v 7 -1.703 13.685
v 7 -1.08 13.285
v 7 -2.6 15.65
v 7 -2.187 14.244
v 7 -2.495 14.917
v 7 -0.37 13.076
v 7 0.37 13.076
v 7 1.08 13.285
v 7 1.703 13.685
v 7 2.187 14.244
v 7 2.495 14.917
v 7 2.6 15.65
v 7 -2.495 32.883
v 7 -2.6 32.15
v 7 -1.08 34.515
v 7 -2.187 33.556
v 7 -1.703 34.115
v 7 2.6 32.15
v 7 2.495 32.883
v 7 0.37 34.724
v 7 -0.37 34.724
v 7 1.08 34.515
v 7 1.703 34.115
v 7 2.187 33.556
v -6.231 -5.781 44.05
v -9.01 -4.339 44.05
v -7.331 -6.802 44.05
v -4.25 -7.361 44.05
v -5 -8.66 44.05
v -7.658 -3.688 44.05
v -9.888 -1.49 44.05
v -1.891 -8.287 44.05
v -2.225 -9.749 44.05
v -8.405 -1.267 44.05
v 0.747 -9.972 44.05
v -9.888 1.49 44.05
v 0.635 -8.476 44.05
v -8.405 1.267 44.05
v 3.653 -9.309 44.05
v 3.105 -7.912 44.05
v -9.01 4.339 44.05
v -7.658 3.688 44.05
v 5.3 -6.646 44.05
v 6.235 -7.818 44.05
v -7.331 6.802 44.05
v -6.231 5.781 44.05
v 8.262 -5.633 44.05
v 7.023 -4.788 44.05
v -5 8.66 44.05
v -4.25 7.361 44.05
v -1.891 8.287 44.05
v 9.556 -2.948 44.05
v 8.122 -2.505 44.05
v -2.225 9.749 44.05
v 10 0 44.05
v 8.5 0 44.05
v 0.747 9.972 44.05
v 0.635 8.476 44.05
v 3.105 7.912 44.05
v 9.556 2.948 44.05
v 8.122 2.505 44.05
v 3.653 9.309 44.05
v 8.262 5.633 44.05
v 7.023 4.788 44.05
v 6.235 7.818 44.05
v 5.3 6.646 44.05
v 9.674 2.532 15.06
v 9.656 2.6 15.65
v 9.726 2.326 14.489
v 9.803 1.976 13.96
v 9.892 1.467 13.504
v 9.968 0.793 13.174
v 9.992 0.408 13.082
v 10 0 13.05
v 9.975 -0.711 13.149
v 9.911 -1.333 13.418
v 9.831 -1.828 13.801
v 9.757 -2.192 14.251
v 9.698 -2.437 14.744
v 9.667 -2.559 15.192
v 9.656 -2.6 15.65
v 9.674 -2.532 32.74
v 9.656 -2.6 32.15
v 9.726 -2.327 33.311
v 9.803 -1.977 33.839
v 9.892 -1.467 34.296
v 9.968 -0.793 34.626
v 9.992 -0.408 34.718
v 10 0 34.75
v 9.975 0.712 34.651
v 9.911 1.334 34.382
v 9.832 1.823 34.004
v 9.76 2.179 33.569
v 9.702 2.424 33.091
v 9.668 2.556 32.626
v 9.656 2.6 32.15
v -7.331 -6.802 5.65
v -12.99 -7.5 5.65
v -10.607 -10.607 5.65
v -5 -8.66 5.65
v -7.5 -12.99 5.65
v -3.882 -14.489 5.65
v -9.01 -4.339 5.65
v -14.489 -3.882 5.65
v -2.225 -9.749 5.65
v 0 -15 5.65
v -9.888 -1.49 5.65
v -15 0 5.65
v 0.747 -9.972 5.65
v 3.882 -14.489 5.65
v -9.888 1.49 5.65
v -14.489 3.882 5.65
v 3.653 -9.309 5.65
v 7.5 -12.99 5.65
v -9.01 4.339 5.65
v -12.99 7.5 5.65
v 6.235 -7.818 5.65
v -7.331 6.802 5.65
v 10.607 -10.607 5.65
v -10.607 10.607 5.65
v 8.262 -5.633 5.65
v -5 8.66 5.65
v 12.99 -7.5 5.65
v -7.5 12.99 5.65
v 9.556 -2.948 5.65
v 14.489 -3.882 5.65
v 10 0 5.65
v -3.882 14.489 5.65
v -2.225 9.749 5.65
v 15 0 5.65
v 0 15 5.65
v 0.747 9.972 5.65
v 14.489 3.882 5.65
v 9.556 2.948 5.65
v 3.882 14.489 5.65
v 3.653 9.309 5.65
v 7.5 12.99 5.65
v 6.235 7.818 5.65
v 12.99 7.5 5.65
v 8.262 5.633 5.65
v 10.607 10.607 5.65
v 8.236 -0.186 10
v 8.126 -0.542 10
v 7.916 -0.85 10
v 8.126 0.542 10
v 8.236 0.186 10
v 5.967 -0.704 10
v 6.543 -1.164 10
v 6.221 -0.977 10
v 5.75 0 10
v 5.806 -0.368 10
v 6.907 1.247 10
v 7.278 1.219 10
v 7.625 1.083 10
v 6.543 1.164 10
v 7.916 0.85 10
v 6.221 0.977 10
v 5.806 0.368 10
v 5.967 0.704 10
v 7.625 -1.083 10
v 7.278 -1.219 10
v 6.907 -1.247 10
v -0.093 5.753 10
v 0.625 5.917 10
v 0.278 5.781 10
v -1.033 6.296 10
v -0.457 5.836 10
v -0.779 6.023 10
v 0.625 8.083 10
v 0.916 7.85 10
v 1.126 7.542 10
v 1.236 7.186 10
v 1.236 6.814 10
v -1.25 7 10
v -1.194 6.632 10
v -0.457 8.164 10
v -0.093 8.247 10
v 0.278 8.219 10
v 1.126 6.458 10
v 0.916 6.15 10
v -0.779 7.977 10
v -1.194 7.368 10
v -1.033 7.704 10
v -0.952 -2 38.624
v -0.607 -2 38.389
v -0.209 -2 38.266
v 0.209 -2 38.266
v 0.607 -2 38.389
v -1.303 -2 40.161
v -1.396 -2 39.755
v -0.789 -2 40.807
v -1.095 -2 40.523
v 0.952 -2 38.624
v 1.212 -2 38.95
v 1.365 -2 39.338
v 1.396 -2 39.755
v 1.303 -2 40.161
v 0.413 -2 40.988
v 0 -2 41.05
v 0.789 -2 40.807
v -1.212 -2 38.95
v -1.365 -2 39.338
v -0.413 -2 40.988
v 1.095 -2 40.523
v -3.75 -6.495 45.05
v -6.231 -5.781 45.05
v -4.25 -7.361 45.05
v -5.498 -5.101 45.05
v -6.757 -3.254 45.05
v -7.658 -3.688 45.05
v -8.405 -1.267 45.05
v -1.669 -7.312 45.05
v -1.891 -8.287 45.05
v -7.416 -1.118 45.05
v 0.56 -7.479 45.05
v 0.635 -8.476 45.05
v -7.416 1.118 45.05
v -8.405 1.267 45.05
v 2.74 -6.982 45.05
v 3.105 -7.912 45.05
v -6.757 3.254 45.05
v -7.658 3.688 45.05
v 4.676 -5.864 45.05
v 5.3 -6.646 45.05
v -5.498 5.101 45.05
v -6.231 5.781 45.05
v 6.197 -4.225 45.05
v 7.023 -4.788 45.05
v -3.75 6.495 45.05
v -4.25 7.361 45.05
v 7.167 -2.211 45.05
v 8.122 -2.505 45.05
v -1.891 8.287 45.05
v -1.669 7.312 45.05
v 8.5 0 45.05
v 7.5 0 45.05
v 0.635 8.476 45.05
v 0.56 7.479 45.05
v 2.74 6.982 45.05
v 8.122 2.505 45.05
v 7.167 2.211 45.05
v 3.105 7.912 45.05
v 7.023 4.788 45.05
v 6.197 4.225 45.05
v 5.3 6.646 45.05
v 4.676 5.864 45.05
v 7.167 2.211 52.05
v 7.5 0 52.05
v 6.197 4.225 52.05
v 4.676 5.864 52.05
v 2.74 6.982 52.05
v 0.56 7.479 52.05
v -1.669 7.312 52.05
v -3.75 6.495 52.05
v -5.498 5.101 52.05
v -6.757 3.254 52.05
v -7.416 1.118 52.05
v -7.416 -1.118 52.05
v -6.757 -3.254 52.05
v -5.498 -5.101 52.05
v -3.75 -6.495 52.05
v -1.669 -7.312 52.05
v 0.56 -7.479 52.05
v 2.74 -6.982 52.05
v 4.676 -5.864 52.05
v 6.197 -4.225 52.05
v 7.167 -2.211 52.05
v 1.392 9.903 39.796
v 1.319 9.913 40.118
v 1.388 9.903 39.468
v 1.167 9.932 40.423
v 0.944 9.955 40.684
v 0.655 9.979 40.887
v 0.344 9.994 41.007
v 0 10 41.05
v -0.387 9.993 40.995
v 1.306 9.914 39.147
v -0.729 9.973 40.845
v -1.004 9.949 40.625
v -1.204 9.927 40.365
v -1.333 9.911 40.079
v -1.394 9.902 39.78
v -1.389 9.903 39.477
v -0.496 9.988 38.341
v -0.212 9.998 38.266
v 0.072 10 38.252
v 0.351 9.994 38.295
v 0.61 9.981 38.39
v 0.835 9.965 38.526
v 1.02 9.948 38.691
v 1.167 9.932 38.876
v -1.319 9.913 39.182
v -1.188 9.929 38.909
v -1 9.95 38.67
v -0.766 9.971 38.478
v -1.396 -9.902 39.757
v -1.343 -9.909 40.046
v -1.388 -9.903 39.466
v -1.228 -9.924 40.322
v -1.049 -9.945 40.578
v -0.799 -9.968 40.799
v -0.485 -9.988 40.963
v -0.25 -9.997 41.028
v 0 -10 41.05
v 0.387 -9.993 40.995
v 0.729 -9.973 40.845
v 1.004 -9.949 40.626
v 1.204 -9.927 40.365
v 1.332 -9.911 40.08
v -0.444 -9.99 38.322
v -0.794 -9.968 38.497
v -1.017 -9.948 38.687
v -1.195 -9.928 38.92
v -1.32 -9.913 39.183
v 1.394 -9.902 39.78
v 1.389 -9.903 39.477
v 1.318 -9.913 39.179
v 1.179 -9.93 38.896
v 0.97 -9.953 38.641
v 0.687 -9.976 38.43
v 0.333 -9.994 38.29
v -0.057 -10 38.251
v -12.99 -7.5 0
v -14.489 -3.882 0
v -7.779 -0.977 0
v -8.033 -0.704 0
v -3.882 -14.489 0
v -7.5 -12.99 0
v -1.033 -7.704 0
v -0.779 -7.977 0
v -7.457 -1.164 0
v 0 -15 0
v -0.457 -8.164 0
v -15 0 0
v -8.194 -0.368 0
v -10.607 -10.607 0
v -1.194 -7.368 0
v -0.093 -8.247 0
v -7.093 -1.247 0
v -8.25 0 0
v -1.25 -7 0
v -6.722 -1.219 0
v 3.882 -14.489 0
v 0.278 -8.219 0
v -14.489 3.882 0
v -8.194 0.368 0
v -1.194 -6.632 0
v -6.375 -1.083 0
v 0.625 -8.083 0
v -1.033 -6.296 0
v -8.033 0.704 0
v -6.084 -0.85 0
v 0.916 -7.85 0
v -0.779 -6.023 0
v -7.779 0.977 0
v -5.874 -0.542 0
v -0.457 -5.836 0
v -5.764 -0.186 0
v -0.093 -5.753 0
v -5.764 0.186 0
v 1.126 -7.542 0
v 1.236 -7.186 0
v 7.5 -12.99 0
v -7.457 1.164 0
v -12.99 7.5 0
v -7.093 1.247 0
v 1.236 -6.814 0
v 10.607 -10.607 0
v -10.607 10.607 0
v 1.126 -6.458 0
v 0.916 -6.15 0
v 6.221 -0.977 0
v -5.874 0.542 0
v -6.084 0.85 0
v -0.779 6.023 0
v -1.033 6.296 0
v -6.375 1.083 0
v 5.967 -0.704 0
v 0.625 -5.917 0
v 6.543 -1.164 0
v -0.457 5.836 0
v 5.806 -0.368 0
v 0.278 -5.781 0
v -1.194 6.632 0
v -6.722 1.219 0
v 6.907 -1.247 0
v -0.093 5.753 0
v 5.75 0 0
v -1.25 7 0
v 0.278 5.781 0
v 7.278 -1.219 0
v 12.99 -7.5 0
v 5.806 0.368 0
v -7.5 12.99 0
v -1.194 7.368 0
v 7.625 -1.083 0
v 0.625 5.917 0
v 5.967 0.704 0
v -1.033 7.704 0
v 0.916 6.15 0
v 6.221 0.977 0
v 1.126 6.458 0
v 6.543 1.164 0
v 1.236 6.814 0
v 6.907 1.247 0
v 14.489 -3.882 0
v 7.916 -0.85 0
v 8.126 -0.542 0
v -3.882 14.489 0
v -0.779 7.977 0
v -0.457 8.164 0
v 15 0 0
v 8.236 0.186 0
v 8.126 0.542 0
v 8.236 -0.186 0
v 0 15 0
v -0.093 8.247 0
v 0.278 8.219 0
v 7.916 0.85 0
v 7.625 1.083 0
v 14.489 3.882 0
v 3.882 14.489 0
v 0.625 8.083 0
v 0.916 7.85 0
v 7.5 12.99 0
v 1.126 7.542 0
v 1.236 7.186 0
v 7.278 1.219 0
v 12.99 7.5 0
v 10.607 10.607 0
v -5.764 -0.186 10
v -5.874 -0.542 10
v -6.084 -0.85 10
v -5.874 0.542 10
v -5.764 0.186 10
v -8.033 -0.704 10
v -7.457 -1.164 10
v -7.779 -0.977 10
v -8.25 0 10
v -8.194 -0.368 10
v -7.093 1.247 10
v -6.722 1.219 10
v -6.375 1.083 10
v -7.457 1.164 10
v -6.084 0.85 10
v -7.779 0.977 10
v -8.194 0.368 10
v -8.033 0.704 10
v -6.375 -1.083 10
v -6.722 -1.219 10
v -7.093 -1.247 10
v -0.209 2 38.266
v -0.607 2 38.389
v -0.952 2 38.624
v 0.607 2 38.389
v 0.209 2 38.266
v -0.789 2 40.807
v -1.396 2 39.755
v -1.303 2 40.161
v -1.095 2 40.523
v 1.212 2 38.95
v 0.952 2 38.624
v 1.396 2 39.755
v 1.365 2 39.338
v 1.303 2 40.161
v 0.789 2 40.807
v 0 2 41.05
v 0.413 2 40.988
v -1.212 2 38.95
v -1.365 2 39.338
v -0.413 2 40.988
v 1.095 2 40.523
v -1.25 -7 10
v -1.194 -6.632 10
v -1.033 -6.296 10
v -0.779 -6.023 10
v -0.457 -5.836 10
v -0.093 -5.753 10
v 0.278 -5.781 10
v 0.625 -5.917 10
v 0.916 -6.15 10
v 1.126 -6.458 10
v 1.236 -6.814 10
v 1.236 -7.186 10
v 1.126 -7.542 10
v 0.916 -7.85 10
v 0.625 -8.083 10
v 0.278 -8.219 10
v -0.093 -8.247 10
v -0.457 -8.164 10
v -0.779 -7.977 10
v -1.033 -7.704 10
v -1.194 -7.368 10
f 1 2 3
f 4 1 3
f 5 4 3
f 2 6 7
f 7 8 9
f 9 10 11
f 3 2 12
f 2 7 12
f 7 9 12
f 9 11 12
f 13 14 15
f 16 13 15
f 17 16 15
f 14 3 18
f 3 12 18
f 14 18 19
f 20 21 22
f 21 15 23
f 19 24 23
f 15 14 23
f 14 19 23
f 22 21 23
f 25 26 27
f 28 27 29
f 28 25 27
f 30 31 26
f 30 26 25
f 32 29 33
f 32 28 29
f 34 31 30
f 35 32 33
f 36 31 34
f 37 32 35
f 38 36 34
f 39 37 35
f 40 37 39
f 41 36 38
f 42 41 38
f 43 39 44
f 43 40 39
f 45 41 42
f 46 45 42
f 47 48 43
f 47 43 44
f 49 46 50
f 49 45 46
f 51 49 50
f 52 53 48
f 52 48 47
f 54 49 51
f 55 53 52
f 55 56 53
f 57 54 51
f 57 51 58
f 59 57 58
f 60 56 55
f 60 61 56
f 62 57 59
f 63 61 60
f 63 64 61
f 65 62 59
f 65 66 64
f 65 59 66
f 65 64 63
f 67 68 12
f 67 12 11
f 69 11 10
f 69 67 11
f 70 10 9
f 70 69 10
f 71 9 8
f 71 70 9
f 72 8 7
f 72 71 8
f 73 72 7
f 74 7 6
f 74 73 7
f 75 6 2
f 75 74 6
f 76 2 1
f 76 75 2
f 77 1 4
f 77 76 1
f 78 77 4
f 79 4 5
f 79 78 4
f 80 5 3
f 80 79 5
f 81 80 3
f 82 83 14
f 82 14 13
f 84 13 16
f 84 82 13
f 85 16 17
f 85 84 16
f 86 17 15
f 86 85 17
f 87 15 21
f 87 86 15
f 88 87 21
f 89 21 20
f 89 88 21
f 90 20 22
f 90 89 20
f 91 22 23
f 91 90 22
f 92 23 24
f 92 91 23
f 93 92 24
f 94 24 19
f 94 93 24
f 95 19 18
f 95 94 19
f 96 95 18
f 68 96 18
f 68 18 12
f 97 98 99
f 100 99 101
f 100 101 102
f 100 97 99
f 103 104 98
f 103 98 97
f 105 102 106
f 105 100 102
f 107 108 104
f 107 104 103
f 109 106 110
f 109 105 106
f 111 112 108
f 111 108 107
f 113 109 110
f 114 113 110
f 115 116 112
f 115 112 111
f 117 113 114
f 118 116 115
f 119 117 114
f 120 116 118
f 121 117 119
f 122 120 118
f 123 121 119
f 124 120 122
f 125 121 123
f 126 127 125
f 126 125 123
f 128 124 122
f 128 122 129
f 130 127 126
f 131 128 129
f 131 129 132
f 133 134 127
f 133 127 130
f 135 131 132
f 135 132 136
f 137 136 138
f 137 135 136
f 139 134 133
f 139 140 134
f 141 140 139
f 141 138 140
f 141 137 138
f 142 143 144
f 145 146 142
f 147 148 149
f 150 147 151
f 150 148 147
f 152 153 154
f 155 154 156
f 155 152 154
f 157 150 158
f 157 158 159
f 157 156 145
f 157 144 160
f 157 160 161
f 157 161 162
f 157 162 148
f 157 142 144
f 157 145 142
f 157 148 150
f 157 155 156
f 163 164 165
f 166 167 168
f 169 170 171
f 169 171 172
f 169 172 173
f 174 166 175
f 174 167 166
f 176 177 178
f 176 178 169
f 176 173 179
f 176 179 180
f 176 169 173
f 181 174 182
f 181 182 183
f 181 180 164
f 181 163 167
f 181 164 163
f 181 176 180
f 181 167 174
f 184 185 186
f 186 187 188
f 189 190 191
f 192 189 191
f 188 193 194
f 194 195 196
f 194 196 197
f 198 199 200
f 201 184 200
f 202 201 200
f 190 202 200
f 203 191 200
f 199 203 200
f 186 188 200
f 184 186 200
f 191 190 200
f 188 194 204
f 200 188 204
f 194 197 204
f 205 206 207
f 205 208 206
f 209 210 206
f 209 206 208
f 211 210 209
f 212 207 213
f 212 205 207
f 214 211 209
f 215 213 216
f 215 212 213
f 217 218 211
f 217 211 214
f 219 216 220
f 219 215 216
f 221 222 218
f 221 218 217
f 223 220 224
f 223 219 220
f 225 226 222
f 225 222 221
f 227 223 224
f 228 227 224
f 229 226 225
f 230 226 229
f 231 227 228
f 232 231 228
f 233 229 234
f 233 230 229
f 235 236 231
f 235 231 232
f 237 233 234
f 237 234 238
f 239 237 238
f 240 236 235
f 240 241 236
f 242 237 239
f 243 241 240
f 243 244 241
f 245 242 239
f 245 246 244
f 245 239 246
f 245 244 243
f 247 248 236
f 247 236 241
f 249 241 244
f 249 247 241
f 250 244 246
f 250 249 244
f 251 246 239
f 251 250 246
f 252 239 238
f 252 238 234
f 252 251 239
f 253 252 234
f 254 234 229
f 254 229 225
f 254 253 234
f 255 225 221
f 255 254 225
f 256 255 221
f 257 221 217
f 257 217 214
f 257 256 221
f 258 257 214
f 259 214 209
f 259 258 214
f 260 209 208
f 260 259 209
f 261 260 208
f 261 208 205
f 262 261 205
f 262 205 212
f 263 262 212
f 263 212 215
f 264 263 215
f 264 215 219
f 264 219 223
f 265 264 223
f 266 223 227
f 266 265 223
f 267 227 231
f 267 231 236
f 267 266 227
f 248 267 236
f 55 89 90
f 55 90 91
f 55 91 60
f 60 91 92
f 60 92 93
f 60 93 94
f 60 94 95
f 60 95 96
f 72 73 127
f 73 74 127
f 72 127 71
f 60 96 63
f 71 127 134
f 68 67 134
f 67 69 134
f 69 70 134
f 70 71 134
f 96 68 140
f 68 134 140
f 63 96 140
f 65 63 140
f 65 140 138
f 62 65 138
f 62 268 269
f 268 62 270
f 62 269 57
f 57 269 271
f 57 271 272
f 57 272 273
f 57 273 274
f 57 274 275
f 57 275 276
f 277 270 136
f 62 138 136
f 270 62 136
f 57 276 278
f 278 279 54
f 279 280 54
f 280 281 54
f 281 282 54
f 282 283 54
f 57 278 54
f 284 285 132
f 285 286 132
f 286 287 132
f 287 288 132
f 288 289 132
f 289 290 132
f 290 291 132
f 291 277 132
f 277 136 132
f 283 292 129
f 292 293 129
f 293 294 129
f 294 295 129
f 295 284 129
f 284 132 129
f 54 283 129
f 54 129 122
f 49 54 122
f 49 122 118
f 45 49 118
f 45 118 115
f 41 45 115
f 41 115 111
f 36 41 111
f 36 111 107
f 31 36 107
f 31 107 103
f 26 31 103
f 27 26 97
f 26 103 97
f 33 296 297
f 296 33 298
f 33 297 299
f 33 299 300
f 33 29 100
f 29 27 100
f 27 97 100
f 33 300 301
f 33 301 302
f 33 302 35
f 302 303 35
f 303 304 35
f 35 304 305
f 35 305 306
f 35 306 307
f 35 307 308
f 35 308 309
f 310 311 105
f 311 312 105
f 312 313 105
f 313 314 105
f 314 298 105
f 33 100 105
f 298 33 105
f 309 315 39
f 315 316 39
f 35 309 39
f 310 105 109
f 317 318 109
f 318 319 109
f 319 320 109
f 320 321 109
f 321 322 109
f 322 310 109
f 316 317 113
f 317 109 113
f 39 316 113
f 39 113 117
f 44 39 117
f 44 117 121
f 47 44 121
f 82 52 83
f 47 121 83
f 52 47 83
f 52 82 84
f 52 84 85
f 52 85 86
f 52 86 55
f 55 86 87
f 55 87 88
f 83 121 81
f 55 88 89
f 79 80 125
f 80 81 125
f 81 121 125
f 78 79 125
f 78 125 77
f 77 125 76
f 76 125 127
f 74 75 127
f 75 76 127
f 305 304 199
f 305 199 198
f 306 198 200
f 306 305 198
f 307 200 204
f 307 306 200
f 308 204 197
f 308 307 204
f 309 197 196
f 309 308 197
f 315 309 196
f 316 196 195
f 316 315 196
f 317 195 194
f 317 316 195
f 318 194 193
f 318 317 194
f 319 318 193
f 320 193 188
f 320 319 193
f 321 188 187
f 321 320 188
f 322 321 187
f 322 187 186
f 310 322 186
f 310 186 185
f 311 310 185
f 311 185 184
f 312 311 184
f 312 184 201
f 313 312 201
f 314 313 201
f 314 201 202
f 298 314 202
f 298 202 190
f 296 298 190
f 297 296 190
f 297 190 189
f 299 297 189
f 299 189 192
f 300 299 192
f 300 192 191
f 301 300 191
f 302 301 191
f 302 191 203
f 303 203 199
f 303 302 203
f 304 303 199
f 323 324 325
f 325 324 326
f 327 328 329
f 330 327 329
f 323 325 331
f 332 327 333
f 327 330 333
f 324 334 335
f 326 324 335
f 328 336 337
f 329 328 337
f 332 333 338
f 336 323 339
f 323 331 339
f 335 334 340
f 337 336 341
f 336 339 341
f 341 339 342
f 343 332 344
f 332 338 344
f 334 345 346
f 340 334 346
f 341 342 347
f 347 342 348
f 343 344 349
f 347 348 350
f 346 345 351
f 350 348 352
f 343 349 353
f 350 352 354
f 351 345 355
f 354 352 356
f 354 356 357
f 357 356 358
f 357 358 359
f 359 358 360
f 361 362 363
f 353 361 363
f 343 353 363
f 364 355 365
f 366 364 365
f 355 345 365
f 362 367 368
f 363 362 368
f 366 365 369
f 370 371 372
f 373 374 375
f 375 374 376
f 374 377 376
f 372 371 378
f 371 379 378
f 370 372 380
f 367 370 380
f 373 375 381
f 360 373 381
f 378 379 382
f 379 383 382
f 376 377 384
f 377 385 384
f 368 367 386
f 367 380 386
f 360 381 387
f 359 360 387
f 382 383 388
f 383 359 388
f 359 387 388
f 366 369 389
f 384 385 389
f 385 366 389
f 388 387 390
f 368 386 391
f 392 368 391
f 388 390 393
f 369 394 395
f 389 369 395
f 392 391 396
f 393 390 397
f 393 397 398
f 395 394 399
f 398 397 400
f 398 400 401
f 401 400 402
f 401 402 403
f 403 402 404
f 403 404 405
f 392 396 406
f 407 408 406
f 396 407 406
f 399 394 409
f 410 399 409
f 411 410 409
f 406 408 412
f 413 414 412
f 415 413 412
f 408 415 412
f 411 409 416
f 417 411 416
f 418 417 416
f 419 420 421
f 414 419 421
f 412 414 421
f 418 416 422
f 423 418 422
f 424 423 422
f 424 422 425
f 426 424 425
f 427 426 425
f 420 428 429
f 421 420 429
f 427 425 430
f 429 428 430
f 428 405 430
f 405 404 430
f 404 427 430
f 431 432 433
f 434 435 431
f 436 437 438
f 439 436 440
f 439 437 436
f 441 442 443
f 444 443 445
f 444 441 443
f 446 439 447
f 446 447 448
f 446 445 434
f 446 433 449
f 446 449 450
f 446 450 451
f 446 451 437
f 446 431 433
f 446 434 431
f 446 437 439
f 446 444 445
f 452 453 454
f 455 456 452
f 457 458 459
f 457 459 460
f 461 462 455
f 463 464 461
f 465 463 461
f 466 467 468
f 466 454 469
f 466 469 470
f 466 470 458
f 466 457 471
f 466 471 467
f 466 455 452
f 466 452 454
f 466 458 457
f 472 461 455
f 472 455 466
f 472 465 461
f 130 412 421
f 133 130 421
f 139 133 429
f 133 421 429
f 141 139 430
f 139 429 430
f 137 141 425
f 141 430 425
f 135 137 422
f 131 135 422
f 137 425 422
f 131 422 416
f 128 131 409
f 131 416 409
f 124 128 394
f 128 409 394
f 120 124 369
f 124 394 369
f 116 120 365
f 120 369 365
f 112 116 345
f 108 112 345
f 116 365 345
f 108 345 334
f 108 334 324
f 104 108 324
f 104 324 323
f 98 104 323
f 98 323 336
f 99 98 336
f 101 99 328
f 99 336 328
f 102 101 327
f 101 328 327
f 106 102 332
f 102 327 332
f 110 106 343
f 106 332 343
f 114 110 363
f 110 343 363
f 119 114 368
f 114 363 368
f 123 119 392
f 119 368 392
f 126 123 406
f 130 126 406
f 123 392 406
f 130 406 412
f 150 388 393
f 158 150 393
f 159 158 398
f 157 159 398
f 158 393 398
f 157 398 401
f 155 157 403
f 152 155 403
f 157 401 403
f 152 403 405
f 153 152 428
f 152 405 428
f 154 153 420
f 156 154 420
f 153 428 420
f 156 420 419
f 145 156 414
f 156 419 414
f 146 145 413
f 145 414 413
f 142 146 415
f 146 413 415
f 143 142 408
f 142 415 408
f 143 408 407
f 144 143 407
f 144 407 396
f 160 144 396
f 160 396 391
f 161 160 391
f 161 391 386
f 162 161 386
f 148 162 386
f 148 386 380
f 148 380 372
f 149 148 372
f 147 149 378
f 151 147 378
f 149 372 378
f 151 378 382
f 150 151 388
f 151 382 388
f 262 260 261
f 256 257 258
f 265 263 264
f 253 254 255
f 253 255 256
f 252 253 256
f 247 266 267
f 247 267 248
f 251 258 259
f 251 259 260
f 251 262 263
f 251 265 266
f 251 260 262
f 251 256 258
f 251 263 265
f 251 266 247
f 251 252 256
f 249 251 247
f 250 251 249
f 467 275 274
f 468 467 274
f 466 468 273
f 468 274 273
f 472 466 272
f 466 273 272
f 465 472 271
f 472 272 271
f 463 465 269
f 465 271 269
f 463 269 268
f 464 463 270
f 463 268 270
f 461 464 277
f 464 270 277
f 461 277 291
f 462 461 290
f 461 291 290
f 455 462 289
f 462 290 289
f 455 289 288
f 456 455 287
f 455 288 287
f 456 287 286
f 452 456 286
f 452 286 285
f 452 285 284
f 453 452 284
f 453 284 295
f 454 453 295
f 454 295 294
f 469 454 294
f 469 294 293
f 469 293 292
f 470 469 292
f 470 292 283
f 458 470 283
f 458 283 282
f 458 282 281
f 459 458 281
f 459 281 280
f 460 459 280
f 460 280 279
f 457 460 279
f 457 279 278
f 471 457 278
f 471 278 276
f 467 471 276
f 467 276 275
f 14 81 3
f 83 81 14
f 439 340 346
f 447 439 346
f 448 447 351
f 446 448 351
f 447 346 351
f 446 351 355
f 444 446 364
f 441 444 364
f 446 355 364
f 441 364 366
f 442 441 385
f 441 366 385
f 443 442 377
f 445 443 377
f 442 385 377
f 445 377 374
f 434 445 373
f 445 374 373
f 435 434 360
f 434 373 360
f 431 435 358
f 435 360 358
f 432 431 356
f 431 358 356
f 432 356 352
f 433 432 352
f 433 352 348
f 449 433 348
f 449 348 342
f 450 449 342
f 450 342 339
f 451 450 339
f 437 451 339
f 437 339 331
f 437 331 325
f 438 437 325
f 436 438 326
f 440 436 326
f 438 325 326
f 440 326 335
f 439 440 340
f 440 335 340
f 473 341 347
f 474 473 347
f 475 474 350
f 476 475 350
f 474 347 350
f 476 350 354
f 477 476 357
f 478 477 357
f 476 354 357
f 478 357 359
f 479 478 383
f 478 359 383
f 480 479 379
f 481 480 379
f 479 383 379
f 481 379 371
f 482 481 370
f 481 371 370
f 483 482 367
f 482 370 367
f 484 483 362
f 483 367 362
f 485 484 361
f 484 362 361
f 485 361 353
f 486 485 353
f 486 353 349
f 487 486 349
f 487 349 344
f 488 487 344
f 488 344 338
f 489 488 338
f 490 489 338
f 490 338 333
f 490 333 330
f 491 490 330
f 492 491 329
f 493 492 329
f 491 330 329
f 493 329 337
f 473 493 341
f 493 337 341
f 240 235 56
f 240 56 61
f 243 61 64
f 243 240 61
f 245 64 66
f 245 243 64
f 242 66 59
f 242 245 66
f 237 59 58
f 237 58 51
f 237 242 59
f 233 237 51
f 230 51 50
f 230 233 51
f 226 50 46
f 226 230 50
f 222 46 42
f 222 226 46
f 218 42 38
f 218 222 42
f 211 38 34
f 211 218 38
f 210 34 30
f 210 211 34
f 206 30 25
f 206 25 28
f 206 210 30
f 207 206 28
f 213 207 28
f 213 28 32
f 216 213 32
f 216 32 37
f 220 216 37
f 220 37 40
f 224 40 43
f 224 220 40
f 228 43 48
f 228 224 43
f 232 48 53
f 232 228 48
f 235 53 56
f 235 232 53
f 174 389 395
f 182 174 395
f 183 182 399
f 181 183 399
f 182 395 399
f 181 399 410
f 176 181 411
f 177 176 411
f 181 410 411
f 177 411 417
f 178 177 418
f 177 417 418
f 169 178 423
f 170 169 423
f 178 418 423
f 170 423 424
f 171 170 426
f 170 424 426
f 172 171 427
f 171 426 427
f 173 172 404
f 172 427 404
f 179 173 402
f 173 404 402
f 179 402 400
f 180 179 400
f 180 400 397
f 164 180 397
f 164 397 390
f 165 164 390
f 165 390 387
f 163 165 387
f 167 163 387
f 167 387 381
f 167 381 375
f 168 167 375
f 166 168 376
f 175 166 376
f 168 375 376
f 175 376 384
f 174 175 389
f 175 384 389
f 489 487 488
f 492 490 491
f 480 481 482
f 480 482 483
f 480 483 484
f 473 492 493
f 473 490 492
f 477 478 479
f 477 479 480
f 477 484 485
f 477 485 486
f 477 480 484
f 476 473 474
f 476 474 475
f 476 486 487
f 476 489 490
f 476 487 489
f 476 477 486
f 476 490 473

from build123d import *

# Parameters (mm, degrees)
SKETCH_1_R          = 15
EXTRUDE_1_DEPTH     = 5.65
SKETCH_2_R          = 10
EXTRUDE_2_DEPTH     = 46.4
SKETCH_3_R          = 1.25
CUT_EXTRUDE_1_DEPTH = 10
SKETCH_4_OUTSIDE_W  = 45.43
SKETCH_4_OUTSIDE_H  = 45.43
SKETCH_4_OUTSIDE_R  = 7.5
CUT_EXTRUDE_2_DEPTH = 7
SKETCH_5_OUTSIDE_W  = 45.43
SKETCH_5_OUTSIDE_H  = 45.43
SKETCH_5_OUTSIDE_R  = 8.5
CUT_EXTRUDE_3_DEPTH = 1
SKETCH_6_R          = 1.4
CUT_EXTRUDE_4_DEPTH = 8
CUT_EXTRUDE_5_DEPTH = 3


with BuildPart() as part:
    # 草图1 → 凸台-拉伸1 (new body)
    with BuildSketch(Plane.XY):
        Circle(SKETCH_1_R)
    extrude(amount=EXTRUDE_1_DEPTH)

    # 草图2 → 凸台-拉伸2 (add)
    with BuildSketch(Plane.XY.offset(5.65)):
        Circle(SKETCH_2_R)
    extrude(amount=EXTRUDE_2_DEPTH)

    # 草图3 → 切除-拉伸1 (cut)
    with BuildSketch(Plane(origin=(0, 0, 0), x_dir=(-1, 0, 0), z_dir=(0, 0, -1))):
        with Locations((0, 7)):
            Circle(SKETCH_3_R)
        with Locations((7, 0)):
            Circle(SKETCH_3_R)
        with Locations((0, -7)):
            Circle(SKETCH_3_R)
        with Locations((-7, 0)):
            Circle(SKETCH_3_R)
    extrude(amount=-CUT_EXTRUDE_1_DEPTH, mode=Mode.SUBTRACT)

    # 草图4 outside → 切除-拉伸2 (cut)
    with BuildSketch(Plane.XY.offset(52.05)):
        Rectangle(SKETCH_4_OUTSIDE_W, SKETCH_4_OUTSIDE_H)
        Circle(SKETCH_4_OUTSIDE_R, mode=Mode.SUBTRACT)
    extrude(amount=-CUT_EXTRUDE_2_DEPTH, mode=Mode.SUBTRACT)

    # 草图5 outside → 切除-拉伸3 (cut)
    with BuildSketch(Plane.XY.offset(45.05)):
        Rectangle(SKETCH_5_OUTSIDE_W, SKETCH_5_OUTSIDE_H)
        Circle(SKETCH_5_OUTSIDE_R, mode=Mode.SUBTRACT)
    extrude(amount=-CUT_EXTRUDE_3_DEPTH, mode=Mode.SUBTRACT)

    # 草图6 → 切除-拉伸4 (cut)
    with BuildSketch(Plane(origin=(0, 10, 0), x_dir=(1, 0, 0), z_dir=(0, 1, 0))):
        with Locations(Location((0, -39.65, 0), (0, 0, 270))):
            Circle(SKETCH_6_R)
    cut_extrude_4 = extrude(amount=-CUT_EXTRUDE_4_DEPTH, mode=Mode.SUBTRACT)

    # 镜向1: 切除-拉伸4 across plane
    add(cut_extrude_4.mirror(Plane.ZX), mode=Mode.SUBTRACT)

    # 草图7 → 切除-拉伸5 (cut)
    with BuildSketch(Plane(origin=(10, 0, 0), x_dir=(0, 0, -1), z_dir=(1, 0, 0))):
        with BuildLine():
            Line((-32.15, 2.6), (-15.65, 2.6))
            ThreePointArc((-15.65, 2.6), (-13.05, 0), (-15.65, -2.6))
            Line((-15.65, -2.6), (-32.15, -2.6))
            ThreePointArc((-32.15, -2.6), (-34.75, 0), (-32.15, 2.6))
        make_face()
    extrude(amount=-CUT_EXTRUDE_5_DEPTH, mode=Mode.SUBTRACT)


solid = part.part
